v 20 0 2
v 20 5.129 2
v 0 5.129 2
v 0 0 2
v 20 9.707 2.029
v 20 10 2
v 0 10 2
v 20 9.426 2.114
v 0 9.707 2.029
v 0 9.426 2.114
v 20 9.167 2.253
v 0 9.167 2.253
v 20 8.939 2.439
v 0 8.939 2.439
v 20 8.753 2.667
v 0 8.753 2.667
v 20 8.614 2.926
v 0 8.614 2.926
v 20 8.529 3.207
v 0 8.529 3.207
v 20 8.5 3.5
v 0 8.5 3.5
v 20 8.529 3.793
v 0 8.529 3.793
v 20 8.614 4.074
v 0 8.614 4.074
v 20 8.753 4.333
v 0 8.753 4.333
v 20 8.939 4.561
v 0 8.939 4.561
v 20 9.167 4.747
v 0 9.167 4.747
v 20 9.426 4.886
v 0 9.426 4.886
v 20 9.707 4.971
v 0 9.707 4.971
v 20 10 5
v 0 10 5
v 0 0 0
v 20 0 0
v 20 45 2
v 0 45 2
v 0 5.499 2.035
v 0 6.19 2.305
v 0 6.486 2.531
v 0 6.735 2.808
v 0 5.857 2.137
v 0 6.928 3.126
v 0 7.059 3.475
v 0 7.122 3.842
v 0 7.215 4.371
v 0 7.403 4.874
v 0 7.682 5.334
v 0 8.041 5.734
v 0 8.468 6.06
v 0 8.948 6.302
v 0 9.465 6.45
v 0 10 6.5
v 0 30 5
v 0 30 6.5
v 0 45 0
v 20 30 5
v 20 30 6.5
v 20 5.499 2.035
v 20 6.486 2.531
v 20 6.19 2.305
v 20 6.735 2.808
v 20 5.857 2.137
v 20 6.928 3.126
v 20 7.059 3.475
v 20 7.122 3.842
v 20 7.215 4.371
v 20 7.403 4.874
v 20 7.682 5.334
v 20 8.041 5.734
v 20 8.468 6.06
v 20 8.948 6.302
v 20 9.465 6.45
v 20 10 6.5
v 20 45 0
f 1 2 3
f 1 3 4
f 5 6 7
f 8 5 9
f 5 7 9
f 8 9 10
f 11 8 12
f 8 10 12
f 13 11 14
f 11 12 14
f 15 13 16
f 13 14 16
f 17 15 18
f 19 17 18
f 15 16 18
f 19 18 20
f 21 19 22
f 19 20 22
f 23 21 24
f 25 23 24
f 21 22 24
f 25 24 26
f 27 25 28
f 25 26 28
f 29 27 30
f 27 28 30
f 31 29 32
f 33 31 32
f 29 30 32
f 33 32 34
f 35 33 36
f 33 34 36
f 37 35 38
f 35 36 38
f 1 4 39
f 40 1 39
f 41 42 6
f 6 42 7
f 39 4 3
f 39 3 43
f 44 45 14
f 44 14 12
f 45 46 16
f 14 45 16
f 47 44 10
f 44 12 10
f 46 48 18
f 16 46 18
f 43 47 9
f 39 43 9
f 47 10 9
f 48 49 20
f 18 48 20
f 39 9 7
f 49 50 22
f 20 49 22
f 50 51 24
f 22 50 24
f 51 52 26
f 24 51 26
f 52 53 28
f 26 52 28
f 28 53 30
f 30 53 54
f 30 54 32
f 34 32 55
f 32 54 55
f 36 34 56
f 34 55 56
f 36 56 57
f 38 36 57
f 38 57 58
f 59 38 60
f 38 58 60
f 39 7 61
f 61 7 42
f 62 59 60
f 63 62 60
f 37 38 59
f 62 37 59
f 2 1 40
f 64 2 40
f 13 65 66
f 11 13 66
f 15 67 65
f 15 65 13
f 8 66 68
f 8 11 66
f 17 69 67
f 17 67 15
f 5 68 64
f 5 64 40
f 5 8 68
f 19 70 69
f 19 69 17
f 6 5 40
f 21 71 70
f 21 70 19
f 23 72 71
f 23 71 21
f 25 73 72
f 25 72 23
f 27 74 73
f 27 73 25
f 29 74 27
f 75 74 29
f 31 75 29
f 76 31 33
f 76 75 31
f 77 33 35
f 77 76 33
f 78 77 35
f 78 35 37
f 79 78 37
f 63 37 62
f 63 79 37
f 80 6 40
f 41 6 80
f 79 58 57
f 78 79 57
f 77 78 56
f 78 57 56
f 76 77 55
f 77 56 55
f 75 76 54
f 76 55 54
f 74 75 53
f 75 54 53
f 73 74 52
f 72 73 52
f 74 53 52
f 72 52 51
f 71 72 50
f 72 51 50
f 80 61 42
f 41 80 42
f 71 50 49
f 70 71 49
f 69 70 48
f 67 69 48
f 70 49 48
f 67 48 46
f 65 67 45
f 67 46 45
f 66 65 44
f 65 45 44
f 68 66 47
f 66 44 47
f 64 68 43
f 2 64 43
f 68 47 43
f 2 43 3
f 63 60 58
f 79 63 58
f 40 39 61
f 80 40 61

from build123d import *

# Parameters (mm, degrees)
F1_DEPTH = 20


with BuildPart() as f1:
    # F0 (on Right) → F1 (new body)
    with BuildSketch(Plane.YZ):
        with BuildLine():
            Line((0, 2), (0, 0))
            Line((0, 0), (45, 0))
            Line((45, 0), (45, 2))
            Line((45, 2), (10, 2))
            ThreePointArc((10, 2), (8.5, 3.5), (10, 5))
            Line((10, 5), (30, 5))
            Line((30, 5), (30, 6.5))
            Line((30, 6.5), (10, 6.5))
            ThreePointArc((10, 6.5), (8.041277, 5.73374), (7.122461, 3.841776))
            ThreePointArc((7.122461, 3.841776), (6.48585, 2.530911), (5.128729, 2))
            Line((5.128729, 2), (0, 2))
        make_face()
    extrude(amount=F1_DEPTH)


solid = f1.part
